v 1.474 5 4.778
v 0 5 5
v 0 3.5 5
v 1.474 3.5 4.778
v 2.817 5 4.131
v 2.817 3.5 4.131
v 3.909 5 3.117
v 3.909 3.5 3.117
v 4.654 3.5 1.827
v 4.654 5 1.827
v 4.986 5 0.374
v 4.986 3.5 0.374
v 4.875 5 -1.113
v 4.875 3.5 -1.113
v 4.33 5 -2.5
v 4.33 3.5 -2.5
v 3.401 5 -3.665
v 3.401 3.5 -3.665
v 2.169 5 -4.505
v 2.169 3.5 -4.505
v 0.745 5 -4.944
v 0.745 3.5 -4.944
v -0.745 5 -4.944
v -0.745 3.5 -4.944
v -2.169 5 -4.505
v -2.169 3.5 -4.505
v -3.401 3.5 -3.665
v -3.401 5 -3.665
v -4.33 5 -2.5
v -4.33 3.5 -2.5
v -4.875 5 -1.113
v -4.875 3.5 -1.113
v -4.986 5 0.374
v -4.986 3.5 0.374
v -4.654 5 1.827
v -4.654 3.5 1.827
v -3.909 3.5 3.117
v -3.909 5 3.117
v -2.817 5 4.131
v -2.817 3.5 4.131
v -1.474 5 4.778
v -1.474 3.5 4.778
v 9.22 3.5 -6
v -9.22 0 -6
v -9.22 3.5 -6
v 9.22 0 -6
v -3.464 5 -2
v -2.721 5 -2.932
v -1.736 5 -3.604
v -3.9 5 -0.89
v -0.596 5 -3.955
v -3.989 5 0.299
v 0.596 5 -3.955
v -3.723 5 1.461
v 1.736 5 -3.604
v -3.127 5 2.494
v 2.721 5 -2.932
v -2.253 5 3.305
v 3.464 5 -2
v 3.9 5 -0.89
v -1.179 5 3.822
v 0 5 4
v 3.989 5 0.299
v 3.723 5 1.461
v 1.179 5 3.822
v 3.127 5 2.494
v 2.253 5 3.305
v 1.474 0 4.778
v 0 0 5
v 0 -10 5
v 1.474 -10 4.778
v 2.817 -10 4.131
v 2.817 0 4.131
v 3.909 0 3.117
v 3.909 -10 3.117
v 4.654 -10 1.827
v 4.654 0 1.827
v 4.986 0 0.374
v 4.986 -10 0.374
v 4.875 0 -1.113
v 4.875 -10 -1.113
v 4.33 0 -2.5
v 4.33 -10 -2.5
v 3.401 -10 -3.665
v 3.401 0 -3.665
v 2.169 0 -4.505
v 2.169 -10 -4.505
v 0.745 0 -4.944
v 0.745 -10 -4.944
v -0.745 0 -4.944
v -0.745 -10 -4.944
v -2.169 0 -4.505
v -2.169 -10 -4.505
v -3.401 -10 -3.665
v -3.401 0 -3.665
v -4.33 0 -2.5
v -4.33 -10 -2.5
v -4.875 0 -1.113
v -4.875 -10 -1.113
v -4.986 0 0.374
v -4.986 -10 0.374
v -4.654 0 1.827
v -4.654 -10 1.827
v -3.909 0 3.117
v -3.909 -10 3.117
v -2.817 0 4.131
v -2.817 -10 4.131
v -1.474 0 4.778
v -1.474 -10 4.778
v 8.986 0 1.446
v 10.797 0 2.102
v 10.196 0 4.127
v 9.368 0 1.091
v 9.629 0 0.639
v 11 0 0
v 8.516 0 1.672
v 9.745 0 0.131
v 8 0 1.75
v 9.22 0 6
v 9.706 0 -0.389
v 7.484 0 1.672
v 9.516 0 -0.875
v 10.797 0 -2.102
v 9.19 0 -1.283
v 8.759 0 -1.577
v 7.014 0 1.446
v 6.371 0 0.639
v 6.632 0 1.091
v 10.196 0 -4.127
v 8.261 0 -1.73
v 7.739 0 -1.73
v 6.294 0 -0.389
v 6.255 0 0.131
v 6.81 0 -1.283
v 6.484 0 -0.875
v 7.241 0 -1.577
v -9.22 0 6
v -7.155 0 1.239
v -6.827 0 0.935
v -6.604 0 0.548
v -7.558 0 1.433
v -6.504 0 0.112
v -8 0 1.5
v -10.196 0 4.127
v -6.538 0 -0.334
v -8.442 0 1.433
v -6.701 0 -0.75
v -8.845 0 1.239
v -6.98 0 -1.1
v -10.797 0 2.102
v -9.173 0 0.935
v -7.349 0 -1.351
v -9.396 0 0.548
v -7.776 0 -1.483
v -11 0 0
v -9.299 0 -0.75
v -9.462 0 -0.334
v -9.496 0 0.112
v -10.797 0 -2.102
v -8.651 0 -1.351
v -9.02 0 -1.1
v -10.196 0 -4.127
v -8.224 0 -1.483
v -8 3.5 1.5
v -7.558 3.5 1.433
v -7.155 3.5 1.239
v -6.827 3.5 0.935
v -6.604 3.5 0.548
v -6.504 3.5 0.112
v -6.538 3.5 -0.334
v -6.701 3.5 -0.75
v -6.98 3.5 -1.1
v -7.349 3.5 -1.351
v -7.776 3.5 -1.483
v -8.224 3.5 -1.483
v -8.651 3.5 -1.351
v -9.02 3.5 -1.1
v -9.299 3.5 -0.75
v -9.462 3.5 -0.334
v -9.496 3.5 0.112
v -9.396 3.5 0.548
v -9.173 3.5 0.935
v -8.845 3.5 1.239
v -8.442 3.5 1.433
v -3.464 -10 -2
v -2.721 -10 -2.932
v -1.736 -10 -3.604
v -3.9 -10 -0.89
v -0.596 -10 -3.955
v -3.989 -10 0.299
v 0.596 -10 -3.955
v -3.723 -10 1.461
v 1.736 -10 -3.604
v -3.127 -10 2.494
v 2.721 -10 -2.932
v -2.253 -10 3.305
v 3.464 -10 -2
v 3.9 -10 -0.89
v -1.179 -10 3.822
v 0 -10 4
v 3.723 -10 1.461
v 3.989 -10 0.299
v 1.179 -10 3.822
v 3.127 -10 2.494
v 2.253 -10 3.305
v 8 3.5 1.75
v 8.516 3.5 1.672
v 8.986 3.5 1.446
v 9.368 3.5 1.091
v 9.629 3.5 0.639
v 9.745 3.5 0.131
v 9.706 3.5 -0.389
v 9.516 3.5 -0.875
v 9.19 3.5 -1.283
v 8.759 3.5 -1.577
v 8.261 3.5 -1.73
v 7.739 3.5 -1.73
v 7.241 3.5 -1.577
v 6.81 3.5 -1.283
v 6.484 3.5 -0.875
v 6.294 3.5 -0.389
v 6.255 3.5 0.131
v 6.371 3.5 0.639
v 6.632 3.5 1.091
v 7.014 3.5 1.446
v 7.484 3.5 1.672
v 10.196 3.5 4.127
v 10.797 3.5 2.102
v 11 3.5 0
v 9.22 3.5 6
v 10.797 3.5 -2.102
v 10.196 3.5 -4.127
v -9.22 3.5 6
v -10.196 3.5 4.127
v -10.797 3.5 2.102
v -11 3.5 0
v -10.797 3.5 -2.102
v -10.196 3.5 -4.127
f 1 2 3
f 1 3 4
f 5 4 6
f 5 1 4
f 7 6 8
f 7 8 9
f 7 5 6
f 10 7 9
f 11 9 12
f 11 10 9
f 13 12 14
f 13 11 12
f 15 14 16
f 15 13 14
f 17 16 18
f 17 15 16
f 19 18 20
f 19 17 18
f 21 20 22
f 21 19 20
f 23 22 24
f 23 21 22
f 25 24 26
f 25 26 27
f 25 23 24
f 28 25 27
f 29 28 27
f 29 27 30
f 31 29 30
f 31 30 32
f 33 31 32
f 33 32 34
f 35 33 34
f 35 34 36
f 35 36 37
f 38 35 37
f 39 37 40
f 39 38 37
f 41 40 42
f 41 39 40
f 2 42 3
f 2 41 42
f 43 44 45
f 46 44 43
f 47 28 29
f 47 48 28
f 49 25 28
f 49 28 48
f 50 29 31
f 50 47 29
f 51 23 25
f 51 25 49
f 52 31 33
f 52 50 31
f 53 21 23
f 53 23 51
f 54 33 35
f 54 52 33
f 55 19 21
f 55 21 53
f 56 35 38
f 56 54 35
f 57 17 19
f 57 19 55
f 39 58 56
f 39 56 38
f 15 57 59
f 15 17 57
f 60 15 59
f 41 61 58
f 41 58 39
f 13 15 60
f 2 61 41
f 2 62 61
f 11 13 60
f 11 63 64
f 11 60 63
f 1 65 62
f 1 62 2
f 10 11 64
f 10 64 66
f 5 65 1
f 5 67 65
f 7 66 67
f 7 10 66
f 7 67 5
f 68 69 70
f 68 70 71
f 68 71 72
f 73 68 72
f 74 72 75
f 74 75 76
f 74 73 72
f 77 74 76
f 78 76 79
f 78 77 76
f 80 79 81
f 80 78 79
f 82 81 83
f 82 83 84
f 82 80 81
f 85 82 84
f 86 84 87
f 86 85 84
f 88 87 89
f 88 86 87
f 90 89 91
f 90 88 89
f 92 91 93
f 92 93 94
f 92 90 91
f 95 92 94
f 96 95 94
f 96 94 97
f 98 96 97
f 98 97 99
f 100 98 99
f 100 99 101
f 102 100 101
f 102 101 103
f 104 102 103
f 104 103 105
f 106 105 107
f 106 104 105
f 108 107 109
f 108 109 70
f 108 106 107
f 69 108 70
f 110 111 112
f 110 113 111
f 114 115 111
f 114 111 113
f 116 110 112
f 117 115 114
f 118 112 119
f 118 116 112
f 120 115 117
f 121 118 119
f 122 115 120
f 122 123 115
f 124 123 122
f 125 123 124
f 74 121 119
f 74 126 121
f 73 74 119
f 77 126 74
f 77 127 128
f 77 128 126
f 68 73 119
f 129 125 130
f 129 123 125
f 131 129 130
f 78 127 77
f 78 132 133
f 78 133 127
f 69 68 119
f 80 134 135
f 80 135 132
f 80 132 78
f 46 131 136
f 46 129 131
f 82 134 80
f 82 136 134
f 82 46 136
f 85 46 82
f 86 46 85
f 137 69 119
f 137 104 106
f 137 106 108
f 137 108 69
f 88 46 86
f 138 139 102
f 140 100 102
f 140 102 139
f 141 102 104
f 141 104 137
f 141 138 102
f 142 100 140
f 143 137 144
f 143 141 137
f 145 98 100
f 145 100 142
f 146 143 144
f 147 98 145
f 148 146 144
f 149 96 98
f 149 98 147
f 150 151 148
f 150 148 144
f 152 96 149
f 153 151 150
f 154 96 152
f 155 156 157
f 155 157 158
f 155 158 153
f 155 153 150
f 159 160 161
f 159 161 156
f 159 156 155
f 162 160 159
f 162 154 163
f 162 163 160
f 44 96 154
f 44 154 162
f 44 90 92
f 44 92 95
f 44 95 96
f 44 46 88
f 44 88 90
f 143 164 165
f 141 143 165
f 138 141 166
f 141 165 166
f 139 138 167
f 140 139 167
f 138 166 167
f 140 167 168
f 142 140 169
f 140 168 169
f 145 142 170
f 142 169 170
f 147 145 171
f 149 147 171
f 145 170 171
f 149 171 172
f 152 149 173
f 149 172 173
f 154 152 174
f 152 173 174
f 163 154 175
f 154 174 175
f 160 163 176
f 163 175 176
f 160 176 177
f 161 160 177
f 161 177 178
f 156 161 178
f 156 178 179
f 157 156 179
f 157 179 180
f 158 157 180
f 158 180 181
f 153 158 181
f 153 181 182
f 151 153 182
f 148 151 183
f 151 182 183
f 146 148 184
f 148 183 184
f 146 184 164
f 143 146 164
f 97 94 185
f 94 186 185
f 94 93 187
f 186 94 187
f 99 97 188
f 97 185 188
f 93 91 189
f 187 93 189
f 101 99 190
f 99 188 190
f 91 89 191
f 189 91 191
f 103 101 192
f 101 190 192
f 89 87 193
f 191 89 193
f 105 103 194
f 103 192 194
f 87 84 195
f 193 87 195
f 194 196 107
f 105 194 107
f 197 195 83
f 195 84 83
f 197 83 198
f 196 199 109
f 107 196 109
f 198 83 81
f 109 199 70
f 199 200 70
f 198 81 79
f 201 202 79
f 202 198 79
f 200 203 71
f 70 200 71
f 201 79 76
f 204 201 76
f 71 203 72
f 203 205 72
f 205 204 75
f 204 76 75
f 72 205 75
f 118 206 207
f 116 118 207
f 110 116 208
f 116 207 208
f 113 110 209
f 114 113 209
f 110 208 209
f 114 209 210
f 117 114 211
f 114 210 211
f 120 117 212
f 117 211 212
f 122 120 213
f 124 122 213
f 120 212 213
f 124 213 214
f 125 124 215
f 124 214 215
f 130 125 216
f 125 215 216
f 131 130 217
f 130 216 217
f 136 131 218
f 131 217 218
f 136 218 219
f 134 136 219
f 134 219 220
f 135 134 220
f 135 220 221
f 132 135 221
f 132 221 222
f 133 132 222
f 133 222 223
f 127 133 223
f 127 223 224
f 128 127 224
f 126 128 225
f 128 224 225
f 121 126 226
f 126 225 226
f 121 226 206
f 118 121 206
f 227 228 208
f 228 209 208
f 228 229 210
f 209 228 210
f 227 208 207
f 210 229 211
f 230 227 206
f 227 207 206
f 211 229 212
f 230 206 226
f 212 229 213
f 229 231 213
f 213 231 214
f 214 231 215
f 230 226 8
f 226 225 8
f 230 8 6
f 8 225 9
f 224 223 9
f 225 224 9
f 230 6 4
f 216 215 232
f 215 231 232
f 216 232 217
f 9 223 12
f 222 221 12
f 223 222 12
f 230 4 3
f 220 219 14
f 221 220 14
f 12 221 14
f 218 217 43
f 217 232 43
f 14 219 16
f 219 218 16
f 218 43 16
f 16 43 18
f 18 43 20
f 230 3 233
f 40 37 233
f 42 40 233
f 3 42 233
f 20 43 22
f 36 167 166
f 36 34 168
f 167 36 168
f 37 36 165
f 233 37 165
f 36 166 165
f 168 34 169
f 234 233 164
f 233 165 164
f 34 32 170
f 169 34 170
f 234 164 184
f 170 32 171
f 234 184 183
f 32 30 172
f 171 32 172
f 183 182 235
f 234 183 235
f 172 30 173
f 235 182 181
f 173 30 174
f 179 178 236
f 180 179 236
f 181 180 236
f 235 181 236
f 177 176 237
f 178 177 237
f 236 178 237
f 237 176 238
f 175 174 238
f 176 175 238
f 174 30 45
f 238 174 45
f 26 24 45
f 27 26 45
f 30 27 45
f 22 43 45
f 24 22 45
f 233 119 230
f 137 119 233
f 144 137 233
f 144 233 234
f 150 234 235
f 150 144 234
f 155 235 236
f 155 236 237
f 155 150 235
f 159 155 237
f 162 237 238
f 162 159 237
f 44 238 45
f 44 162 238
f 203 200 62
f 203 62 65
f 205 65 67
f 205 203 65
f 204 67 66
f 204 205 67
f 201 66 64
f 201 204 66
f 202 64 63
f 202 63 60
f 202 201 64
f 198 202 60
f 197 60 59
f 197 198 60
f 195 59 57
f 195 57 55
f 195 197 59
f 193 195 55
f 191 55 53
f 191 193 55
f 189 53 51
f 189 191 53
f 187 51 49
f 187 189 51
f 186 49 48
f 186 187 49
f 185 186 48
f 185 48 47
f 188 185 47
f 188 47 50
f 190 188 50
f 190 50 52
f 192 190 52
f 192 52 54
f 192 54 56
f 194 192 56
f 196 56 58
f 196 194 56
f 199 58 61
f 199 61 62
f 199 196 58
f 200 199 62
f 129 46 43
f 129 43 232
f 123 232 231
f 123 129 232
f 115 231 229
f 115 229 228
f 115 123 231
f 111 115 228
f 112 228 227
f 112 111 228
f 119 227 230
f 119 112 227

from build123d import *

# Parameters (mm, degrees)
EXTRUDE_1_DEPTH     = 3.5
CUT_EXTRUDE_START   = 3.5
SKETCH_2_R          = 1.75
SKETCH_2_R_2        = 1.5
CUT_EXTRUDE_1_DEPTH = 3.5
SKETCH_3_R          = 5
EXTRUDE_2_DEPTH     = 10
EXTRUDE_START       = 5
SKETCH_4_R          = 5
EXTRUDE_3_DEPTH     = 1.5
CUT_EXTRUDE_START_2 = -10
SKETCH_5_R          = 4
CUT_EXTRUDE_2_DEPTH = 15


with BuildPart() as part:
    # 草图1 → 凸台-拉伸1 (new body)
    with BuildSketch(Plane(origin=(0, 0, 0), x_dir=(1, 0, 0), z_dir=(0, 1, 0))):
        with BuildLine():
            Line((-9.219544457, 6), (9.219544457, 6))
            ThreePointArc((9.219544457, 6), (11, 0), (9.219544457, -6))
            Line((9.219544457, -6), (-9.219544457, -6))
            ThreePointArc((-9.219544457, -6), (-11, 0), (-9.219544457, 6))
        make_face()
    extrude(amount=EXTRUDE_1_DEPTH)

    # 草图2 → 切除-拉伸1 (cut)
    with BuildSketch(Plane(origin=(0, 0, 0), x_dir=(1, 0, 0), z_dir=(0, 1, 0)).offset(CUT_EXTRUDE_START)):
        with Locations(Location((8, 0, 0), (0, 0, 270))):
            Circle(SKETCH_2_R)
        with Locations(Location((-8, 0, 0), (0, 0, 270))):
            Circle(SKETCH_2_R_2)
    extrude(amount=-CUT_EXTRUDE_1_DEPTH, mode=Mode.SUBTRACT)

    # 草图3 → 凸台-拉伸2 (add)
    with BuildSketch(Plane(origin=(0, 0, 0), x_dir=(1, 0, 0), z_dir=(0, 1, 0))):
        with Locations(Location((0, 0, 0), (0, 0, 270))):
            Circle(SKETCH_3_R)
    extrude(amount=-EXTRUDE_2_DEPTH)

    # 草图4 → 凸台-拉伸3 (add)
    with BuildSketch(Plane(origin=(0, 0, 0), x_dir=(1, 0, 0), z_dir=(0, 1, 0)).offset(EXTRUDE_START)):
        with Locations(Location((0, 0, 0), (0, 0, 270))):
            Circle(SKETCH_4_R)
    extrude(amount=-EXTRUDE_3_DEPTH)

    # 草图5 → 切除-拉伸2 (cut)
    with BuildSketch(Plane(origin=(0, 0, 0), x_dir=(1, 0, 0), z_dir=(0, 1, 0)).offset(CUT_EXTRUDE_START_2)):
        with Locations(Location((0, 0, 0), (0, 0, 270))):
            Circle(SKETCH_5_R)
    extrude(amount=CUT_EXTRUDE_2_DEPTH, mode=Mode.SUBTRACT)


solid = part.part
